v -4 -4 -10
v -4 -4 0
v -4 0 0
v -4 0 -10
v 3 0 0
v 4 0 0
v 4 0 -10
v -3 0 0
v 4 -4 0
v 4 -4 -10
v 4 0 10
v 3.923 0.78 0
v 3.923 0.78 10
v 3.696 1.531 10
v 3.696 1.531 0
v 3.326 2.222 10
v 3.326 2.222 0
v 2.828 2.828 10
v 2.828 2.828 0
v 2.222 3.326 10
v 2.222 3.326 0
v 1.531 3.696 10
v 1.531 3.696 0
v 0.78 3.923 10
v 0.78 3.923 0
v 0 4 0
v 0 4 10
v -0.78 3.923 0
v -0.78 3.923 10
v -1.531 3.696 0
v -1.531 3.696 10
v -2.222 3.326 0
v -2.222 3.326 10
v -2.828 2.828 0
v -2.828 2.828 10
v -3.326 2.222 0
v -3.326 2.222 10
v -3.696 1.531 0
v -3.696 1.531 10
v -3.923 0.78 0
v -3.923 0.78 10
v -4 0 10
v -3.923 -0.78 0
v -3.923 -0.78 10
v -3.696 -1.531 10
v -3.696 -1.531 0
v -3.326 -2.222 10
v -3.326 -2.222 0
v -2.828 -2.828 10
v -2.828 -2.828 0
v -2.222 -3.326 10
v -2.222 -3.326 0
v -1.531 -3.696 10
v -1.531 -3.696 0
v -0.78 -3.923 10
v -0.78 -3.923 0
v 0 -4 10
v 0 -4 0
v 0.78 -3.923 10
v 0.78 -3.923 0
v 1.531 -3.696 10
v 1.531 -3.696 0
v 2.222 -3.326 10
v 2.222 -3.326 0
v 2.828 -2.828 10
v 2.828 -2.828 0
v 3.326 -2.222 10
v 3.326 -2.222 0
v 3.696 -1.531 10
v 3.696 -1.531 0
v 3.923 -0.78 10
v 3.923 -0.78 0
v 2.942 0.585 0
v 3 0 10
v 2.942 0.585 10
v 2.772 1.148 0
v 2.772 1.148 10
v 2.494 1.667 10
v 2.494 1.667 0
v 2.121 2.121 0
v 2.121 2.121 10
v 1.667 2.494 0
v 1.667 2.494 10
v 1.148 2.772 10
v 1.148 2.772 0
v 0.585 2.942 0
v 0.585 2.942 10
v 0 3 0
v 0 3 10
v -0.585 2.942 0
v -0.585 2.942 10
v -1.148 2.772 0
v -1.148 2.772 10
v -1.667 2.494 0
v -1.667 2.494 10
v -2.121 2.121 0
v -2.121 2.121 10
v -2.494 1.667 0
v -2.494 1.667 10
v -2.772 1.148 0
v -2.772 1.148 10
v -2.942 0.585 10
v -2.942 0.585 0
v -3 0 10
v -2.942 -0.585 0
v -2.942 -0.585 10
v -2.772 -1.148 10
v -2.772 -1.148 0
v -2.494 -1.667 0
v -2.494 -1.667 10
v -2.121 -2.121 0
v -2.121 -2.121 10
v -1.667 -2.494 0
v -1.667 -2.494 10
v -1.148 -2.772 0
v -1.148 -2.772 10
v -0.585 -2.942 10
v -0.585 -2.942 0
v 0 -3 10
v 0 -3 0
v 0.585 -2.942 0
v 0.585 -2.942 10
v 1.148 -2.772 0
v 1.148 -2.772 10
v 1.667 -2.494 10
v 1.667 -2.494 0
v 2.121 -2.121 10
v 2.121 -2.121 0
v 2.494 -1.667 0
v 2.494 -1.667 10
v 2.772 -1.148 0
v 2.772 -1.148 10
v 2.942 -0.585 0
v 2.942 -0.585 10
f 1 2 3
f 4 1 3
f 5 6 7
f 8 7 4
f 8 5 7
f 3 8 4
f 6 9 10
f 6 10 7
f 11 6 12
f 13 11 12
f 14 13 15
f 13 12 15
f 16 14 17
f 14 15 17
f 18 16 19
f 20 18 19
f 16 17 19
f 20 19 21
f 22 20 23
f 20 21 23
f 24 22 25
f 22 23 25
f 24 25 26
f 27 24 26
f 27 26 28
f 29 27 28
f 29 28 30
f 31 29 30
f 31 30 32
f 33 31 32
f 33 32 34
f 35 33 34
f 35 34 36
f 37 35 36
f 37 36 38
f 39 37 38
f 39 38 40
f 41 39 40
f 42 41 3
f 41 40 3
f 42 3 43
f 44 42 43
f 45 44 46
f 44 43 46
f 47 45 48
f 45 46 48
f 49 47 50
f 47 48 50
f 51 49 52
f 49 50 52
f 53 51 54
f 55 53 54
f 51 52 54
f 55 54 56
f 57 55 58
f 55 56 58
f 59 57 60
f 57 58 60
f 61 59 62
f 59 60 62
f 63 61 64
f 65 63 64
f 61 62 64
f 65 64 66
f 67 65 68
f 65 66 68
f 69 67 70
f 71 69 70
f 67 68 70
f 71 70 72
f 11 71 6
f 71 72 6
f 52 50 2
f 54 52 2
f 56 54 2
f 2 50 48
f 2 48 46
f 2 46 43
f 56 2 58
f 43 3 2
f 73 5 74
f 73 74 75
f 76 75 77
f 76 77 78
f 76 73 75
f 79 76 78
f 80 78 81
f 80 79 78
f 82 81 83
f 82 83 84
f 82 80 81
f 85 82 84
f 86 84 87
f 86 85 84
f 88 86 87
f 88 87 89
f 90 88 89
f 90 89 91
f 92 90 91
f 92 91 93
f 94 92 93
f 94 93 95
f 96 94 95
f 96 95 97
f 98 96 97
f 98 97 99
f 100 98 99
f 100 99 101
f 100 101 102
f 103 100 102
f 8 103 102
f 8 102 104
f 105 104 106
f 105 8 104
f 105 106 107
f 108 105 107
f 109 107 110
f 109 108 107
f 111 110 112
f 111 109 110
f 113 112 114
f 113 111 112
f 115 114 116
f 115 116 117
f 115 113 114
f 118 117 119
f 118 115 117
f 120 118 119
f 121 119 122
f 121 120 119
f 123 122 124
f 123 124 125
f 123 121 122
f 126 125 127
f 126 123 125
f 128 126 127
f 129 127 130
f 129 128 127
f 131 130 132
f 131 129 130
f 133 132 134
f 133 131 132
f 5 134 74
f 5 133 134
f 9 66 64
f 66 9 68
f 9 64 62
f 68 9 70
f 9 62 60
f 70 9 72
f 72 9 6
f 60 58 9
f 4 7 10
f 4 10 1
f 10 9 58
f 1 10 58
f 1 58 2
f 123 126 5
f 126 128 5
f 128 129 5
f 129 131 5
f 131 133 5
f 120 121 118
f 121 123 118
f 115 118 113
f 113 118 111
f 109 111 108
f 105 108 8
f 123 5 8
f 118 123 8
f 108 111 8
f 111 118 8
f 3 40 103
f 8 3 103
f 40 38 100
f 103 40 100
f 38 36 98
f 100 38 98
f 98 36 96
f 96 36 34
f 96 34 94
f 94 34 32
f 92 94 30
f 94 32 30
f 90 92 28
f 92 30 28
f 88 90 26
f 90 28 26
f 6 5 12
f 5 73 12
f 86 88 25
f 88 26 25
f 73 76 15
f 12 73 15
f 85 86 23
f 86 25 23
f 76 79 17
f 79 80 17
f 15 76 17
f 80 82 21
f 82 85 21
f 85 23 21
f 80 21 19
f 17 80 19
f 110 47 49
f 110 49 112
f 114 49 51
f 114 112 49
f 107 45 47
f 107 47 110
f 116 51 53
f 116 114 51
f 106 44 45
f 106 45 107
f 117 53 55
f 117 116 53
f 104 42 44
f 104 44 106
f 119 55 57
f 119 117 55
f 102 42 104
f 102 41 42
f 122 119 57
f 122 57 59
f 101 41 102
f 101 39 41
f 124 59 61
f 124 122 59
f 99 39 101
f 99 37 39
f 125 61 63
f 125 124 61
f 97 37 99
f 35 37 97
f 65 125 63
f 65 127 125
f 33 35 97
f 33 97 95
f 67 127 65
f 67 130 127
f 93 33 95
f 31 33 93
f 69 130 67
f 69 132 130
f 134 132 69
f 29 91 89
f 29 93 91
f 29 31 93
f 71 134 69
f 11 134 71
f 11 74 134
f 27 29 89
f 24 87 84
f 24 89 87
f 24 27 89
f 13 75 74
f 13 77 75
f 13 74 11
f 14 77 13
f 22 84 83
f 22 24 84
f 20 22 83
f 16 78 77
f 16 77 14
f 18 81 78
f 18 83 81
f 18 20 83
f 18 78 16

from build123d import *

# Parameters (mm, degrees)
ESBO_O1_R                = 4
ESBO_O1_R_2              = 3
RESSALTO_EXTRUS_O1_DEPTH = 10
ESBO_O2_W                = 8
ESBO_O2_H                = 4
RESSALTO_EXTRUS_O2_DEPTH = 10


with BuildPart() as part:
    # Esboço1 → Ressalto-extrusão1 (new body)
    with BuildSketch(Plane.XY):
        Circle(ESBO_O1_R)
        Circle(ESBO_O1_R_2, mode=Mode.SUBTRACT)
    extrude(amount=RESSALTO_EXTRUS_O1_DEPTH)

    # Esboço2 → Ressalto-extrusão2 (add)
    with BuildSketch(Plane(origin=(0, 0, 0), x_dir=(-1, 0, 0), z_dir=(0, 0, -1))):
        with Locations((0, -2)):
            Rectangle(ESBO_O2_W, ESBO_O2_H)
    extrude(amount=RESSALTO_EXTRUS_O2_DEPTH)


solid = part.part
